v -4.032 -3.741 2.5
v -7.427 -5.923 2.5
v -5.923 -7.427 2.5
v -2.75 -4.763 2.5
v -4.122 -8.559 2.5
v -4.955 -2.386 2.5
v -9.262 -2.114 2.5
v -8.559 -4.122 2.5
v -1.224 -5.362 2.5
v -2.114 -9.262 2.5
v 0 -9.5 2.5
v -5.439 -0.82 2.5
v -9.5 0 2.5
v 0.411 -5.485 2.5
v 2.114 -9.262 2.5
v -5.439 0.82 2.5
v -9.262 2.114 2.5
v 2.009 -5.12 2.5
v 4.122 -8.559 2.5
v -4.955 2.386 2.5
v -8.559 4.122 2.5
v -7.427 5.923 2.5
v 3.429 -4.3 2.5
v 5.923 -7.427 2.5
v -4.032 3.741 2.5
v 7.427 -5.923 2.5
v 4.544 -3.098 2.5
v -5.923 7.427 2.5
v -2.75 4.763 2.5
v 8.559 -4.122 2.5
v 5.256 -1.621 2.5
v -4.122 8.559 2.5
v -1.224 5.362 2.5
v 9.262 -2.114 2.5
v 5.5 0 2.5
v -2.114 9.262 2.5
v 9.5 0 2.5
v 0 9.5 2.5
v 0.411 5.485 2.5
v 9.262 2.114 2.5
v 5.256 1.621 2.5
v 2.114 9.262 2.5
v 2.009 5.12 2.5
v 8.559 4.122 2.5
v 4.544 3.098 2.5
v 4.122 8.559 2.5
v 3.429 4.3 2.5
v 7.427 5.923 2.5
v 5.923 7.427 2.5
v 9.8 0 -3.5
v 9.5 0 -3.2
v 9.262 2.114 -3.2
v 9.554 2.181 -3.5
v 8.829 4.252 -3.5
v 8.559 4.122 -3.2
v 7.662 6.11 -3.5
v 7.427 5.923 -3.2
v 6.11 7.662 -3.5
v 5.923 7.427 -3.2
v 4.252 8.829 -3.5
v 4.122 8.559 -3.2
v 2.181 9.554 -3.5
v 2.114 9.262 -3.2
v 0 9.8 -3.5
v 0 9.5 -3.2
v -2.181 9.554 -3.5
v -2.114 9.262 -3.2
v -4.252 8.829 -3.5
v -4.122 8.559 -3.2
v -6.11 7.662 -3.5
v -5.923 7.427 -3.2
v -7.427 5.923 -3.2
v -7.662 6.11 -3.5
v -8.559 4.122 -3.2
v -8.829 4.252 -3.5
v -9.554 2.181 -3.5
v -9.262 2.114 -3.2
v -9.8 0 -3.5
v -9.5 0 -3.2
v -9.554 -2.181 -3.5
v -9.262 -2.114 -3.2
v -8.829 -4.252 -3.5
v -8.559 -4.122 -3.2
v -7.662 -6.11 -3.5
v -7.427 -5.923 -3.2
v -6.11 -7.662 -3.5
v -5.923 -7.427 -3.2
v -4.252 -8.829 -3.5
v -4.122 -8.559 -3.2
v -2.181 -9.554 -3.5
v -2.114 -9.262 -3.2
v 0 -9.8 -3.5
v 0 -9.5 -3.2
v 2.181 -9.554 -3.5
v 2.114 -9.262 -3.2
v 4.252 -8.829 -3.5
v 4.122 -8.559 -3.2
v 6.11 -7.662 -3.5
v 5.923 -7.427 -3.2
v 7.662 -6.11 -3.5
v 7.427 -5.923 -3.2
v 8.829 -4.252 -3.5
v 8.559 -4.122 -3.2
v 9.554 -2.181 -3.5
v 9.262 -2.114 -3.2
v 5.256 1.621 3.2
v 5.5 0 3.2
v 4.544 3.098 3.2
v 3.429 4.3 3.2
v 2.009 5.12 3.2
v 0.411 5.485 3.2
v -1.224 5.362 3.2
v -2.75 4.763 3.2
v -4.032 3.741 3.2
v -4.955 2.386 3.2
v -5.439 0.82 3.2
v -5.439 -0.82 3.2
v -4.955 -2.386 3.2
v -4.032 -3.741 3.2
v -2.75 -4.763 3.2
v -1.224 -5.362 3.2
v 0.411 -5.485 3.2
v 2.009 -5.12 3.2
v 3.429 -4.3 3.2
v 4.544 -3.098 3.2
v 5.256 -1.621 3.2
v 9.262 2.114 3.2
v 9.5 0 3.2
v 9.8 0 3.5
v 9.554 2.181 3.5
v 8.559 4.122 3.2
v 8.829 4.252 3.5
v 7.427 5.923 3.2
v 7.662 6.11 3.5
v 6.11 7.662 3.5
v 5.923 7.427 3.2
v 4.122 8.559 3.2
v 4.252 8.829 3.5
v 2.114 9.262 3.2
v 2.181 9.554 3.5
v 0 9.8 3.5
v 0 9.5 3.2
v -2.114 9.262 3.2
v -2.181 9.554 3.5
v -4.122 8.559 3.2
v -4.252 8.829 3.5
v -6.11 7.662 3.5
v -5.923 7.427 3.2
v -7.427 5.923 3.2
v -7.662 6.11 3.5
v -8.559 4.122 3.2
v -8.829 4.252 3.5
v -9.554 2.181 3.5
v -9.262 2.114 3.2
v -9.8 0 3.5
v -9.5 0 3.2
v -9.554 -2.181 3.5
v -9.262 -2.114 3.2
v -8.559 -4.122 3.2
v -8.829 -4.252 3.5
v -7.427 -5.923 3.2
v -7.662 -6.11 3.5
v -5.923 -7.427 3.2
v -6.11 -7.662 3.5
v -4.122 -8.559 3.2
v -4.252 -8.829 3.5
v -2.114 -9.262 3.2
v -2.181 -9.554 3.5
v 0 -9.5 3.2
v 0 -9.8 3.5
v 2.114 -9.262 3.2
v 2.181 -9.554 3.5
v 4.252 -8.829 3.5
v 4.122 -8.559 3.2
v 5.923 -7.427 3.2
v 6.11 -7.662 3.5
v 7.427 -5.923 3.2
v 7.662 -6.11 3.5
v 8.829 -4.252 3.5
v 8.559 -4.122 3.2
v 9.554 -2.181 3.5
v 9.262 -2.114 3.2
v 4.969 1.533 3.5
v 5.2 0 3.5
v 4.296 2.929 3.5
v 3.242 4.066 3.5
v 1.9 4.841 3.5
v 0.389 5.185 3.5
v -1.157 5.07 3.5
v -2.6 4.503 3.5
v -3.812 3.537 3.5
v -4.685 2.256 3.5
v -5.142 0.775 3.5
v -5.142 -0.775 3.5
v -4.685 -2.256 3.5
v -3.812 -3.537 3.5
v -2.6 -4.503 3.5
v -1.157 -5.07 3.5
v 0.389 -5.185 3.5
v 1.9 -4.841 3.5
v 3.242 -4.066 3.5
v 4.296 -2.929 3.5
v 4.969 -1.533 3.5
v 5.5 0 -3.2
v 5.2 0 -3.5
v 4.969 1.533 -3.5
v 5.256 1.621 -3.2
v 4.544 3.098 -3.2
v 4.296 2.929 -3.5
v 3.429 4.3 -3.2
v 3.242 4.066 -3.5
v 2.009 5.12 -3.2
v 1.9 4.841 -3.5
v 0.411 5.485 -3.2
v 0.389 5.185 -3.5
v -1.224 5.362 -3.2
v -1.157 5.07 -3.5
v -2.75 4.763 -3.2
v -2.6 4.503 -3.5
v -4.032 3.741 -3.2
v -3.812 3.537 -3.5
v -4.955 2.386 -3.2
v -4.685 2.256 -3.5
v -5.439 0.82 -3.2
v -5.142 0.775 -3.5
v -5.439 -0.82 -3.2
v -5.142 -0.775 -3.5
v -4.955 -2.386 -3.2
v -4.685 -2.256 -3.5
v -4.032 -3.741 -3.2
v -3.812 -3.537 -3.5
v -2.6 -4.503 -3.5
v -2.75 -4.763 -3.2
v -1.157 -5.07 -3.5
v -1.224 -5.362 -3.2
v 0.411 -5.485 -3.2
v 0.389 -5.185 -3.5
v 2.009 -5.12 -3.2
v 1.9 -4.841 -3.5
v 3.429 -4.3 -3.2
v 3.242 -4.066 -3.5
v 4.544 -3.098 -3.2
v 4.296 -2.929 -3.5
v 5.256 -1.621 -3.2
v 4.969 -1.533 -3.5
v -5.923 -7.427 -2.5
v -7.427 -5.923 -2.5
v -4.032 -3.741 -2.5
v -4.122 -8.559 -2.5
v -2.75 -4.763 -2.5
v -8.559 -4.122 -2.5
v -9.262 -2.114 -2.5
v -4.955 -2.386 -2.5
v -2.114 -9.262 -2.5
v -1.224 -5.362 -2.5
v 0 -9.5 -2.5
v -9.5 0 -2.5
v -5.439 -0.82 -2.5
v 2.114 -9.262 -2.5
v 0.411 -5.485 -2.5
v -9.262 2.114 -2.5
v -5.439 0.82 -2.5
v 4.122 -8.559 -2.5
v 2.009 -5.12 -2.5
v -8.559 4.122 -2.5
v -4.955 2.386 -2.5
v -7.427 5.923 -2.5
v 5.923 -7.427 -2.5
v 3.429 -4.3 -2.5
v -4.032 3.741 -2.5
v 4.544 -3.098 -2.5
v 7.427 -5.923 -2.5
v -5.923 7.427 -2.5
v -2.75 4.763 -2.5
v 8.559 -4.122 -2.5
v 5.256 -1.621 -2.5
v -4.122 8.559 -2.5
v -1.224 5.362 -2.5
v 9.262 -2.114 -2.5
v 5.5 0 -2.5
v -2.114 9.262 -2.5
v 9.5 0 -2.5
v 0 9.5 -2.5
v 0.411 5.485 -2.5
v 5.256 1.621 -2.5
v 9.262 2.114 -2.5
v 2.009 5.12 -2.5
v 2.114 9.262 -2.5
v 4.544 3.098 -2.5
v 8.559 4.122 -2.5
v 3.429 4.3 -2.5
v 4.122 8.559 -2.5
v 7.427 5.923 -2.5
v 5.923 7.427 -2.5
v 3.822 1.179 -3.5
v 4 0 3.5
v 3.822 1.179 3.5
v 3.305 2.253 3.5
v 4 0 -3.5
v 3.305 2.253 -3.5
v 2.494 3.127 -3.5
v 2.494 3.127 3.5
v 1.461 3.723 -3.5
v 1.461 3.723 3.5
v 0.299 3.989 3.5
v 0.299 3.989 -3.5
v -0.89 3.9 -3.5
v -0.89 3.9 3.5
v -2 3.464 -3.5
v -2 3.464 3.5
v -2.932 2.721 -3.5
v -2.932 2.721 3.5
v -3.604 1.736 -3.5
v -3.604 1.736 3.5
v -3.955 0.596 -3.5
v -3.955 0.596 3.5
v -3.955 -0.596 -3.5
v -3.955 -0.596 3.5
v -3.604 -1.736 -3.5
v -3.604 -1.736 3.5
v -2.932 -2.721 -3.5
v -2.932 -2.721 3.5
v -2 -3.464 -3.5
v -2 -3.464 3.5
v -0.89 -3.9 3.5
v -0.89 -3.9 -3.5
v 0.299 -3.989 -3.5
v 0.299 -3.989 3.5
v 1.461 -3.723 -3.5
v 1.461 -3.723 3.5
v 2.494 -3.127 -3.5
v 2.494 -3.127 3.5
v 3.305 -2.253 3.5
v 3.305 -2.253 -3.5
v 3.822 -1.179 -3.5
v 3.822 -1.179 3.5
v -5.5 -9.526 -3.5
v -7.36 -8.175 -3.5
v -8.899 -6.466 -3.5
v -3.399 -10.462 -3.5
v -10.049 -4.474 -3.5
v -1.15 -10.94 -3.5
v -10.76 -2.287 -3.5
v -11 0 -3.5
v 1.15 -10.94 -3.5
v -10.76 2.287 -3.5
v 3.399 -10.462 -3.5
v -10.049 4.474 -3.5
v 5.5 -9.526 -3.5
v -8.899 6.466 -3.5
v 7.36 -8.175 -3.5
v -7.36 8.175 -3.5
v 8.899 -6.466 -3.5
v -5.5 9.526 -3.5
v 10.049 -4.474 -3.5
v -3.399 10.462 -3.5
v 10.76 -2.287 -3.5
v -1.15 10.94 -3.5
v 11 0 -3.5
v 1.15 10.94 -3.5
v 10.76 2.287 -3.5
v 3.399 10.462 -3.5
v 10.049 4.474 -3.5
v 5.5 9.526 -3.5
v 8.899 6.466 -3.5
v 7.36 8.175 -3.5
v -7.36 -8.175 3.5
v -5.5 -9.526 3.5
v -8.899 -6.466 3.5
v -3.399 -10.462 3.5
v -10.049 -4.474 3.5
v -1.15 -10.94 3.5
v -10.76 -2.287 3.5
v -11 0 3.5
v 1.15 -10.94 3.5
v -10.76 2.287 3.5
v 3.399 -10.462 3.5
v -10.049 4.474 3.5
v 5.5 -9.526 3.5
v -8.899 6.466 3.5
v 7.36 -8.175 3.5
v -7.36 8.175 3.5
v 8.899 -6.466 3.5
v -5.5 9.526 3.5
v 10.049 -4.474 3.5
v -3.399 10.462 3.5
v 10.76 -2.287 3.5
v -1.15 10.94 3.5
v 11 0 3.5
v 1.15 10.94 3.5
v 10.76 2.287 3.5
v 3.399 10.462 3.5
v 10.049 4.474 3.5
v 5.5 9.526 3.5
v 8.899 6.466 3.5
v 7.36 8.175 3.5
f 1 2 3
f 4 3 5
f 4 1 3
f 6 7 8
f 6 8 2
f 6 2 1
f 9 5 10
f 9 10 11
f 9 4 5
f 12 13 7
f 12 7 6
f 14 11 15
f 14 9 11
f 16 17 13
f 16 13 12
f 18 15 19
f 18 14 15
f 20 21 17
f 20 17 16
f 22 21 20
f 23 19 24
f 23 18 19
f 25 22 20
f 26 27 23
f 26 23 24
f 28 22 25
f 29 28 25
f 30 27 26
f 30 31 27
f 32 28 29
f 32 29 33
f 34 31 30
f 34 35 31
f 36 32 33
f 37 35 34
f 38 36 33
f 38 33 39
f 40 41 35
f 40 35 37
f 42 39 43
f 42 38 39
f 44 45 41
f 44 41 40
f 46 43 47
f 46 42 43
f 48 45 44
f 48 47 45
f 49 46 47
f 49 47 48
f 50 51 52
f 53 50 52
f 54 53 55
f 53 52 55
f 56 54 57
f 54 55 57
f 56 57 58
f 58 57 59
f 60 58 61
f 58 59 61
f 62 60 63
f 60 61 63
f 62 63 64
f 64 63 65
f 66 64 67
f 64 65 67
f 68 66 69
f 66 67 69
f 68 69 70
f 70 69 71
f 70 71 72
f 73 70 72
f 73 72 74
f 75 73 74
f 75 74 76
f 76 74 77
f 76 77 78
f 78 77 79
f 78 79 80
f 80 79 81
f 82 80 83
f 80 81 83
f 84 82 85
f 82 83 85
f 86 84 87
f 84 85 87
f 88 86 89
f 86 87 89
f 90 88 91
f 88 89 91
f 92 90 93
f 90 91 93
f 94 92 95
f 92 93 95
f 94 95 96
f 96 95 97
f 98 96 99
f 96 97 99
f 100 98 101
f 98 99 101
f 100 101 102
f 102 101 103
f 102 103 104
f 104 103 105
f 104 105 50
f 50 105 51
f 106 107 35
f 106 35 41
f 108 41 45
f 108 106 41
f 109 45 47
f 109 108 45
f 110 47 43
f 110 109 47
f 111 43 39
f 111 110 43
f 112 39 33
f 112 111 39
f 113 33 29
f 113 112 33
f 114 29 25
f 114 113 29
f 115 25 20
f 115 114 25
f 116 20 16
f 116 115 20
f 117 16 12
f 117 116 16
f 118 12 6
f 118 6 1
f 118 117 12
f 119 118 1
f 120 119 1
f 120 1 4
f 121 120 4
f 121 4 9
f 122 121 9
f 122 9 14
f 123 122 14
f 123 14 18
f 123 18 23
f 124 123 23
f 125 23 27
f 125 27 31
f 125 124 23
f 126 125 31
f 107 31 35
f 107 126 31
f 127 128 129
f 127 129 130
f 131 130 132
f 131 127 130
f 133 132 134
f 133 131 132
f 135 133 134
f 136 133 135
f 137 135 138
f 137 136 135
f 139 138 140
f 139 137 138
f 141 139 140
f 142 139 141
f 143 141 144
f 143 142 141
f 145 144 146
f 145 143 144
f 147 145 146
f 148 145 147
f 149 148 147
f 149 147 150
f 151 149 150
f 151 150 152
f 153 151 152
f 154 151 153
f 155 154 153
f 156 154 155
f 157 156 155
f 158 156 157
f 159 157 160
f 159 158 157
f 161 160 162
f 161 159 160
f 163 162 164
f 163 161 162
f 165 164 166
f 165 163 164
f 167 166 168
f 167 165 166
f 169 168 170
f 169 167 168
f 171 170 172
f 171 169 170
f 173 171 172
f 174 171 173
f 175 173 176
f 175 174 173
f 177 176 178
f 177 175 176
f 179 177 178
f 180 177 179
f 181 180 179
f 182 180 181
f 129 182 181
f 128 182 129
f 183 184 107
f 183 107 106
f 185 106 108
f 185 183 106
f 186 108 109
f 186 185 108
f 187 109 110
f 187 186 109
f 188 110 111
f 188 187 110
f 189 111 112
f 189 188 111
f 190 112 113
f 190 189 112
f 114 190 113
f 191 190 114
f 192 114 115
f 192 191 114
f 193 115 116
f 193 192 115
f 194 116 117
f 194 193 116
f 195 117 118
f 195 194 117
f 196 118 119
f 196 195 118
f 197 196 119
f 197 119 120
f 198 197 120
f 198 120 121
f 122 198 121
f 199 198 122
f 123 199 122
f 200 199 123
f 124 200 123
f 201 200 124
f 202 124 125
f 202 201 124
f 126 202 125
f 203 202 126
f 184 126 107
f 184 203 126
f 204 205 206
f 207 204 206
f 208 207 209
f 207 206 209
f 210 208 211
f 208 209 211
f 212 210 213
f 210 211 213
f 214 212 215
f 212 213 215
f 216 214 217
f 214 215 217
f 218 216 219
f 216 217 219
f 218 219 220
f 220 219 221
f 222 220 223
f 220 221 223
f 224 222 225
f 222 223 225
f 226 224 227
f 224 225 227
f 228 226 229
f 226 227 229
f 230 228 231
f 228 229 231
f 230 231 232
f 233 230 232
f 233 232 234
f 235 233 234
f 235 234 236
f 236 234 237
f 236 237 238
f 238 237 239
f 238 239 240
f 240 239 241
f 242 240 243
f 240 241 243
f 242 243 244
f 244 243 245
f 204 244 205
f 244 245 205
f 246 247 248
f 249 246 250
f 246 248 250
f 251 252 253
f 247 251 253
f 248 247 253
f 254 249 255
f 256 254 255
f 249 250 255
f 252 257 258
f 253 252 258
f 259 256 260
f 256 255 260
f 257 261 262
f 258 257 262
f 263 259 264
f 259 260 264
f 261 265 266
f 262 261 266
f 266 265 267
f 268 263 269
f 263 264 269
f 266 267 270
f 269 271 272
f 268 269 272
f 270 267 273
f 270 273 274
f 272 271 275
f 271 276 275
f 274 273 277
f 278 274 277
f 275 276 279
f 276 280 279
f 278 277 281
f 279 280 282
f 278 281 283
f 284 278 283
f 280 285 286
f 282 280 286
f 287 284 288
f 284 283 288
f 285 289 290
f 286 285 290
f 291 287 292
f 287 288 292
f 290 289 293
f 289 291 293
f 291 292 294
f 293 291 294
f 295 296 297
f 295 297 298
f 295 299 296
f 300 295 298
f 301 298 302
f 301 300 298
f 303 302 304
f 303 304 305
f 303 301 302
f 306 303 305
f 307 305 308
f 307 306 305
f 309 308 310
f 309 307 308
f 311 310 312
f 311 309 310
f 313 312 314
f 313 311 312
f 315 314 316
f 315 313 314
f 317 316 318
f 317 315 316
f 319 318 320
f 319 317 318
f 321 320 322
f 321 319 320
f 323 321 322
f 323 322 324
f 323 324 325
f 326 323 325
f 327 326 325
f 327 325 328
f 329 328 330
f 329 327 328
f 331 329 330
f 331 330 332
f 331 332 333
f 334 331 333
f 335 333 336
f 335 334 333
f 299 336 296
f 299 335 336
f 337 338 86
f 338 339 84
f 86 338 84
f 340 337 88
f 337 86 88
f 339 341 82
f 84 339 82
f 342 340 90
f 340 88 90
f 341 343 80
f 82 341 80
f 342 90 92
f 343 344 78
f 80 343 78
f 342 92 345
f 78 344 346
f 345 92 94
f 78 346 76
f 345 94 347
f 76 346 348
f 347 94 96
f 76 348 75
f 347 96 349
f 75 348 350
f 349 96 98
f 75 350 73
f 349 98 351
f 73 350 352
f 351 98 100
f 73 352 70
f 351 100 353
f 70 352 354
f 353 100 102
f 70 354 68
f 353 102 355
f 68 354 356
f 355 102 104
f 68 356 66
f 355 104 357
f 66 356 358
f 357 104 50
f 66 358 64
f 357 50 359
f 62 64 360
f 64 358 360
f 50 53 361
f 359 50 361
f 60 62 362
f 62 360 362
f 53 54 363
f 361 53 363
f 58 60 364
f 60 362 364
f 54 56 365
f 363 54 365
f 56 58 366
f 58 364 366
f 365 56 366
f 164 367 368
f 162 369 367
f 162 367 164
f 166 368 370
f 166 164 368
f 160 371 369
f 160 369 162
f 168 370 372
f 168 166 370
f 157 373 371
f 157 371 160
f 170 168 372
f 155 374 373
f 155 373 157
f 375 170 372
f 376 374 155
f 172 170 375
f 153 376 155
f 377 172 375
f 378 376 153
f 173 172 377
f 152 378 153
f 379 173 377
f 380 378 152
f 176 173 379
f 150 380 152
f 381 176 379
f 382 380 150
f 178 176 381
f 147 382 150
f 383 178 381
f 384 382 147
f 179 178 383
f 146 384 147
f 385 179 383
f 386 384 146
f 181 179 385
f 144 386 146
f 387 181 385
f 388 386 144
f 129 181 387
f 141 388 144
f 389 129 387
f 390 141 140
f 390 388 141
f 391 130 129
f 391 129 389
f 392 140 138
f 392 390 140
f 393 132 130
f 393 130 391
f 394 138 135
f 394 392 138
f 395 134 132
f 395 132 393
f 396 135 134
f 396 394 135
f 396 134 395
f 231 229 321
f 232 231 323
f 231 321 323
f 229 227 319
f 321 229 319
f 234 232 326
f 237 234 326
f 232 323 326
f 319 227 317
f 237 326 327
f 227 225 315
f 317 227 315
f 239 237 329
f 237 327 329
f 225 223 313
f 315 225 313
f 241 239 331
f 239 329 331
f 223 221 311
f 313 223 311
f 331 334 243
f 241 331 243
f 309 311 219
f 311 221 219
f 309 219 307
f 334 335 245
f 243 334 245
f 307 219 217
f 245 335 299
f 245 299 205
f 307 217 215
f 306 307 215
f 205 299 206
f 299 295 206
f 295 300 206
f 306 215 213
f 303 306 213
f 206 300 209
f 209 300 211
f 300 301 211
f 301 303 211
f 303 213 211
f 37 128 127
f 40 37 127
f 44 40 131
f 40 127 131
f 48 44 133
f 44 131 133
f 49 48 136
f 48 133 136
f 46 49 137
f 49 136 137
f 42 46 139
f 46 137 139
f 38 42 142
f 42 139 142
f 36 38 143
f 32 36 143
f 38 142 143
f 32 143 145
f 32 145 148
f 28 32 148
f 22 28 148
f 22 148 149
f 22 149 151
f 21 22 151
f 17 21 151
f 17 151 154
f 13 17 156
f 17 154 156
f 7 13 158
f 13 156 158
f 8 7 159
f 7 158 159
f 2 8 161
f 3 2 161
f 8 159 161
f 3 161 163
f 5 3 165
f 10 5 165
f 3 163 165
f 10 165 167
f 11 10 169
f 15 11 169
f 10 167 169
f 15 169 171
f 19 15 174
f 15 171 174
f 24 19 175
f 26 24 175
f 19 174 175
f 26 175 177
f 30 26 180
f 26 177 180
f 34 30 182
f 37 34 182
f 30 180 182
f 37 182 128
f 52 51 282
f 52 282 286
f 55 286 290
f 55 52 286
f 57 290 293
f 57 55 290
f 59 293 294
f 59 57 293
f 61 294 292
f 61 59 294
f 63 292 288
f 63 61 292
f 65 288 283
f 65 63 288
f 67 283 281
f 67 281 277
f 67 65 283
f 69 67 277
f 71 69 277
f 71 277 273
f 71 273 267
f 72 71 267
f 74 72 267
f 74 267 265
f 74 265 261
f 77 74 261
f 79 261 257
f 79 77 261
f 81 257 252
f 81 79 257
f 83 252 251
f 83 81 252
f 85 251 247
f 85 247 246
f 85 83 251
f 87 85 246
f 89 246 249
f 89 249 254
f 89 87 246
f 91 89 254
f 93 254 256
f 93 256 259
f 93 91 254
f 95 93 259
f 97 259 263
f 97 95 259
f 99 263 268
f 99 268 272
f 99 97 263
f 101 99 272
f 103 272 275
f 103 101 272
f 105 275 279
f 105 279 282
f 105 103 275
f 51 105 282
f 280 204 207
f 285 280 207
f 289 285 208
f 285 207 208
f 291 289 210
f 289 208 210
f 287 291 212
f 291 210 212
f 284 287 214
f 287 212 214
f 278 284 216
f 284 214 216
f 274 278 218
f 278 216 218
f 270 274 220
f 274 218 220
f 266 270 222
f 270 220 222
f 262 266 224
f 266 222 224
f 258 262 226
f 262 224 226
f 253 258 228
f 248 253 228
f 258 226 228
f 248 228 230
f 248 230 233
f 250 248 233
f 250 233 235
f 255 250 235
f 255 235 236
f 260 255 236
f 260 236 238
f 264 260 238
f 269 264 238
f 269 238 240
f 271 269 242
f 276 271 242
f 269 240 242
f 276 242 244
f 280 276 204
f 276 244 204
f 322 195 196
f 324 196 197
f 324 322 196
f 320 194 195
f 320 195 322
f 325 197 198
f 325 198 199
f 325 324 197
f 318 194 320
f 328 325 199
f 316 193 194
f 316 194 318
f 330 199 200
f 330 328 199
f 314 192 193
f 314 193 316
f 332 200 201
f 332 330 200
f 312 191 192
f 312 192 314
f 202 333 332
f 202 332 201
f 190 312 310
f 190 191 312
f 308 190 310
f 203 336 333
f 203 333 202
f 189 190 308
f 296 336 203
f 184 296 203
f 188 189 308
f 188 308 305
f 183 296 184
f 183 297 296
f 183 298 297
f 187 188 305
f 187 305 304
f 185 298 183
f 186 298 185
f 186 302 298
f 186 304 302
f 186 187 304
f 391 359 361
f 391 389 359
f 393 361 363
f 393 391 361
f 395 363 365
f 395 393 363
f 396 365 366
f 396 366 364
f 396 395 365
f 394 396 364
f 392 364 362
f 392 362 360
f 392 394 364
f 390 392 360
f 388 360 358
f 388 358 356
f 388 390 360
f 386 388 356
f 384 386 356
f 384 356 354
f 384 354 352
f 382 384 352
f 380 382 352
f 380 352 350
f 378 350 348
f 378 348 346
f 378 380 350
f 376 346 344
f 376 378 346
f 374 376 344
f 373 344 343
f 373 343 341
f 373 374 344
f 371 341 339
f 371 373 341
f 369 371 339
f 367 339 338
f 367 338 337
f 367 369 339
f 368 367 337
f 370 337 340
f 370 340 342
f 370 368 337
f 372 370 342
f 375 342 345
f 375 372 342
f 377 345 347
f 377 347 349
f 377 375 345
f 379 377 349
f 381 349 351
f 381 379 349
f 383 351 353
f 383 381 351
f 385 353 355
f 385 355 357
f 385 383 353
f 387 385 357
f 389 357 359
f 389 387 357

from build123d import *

# Parameters (mm, degrees)
CROQUIS1_R              = 11
CROQUIS1_R_2            = 4
SALIENTE_EXTRUIR1_DEPTH = 3.5
CROQUIS2_R              = 9.5
CROQUIS2_R_2            = 5.5
CORTAR_EXTRUIR1_DEPTH   = 1
CHAFL_N1_SIZE           = 0.3


with BuildPart() as part:
    # Croquis1 → Saliente-Extruir1 (new, symmetric)
    with BuildSketch(Plane.XY):
        Circle(CROQUIS1_R)
        Circle(CROQUIS1_R_2, mode=Mode.SUBTRACT)
    extrude(amount=SALIENTE_EXTRUIR1_DEPTH, both=True)

    # Croquis2 → Cortar-Extruir1 (cut)
    with BuildSketch(Plane.XY.offset(3.5)):
        Circle(CROQUIS2_R)
        Circle(CROQUIS2_R_2, mode=Mode.SUBTRACT)
    cortar_extruir1 = extrude(amount=-CORTAR_EXTRUIR1_DEPTH, mode=Mode.SUBTRACT)

    # Simetría1: Cortar-Extruir1 across plane
    add(cortar_extruir1.mirror(Plane.XY), mode=Mode.SUBTRACT)

    # Chaflán1
    chafl_n1_edges = [part.edges().sort_by_distance(p)[0] for p in [
        (-9.5, 0, 3.5),
        (-5.5, 0, 3.5),
        (-5.5, 0, -3.5),
        (-9.5, 0, -3.5),
    ]]
    chamfer(chafl_n1_edges, length=CHAFL_N1_SIZE)


solid = part.part
